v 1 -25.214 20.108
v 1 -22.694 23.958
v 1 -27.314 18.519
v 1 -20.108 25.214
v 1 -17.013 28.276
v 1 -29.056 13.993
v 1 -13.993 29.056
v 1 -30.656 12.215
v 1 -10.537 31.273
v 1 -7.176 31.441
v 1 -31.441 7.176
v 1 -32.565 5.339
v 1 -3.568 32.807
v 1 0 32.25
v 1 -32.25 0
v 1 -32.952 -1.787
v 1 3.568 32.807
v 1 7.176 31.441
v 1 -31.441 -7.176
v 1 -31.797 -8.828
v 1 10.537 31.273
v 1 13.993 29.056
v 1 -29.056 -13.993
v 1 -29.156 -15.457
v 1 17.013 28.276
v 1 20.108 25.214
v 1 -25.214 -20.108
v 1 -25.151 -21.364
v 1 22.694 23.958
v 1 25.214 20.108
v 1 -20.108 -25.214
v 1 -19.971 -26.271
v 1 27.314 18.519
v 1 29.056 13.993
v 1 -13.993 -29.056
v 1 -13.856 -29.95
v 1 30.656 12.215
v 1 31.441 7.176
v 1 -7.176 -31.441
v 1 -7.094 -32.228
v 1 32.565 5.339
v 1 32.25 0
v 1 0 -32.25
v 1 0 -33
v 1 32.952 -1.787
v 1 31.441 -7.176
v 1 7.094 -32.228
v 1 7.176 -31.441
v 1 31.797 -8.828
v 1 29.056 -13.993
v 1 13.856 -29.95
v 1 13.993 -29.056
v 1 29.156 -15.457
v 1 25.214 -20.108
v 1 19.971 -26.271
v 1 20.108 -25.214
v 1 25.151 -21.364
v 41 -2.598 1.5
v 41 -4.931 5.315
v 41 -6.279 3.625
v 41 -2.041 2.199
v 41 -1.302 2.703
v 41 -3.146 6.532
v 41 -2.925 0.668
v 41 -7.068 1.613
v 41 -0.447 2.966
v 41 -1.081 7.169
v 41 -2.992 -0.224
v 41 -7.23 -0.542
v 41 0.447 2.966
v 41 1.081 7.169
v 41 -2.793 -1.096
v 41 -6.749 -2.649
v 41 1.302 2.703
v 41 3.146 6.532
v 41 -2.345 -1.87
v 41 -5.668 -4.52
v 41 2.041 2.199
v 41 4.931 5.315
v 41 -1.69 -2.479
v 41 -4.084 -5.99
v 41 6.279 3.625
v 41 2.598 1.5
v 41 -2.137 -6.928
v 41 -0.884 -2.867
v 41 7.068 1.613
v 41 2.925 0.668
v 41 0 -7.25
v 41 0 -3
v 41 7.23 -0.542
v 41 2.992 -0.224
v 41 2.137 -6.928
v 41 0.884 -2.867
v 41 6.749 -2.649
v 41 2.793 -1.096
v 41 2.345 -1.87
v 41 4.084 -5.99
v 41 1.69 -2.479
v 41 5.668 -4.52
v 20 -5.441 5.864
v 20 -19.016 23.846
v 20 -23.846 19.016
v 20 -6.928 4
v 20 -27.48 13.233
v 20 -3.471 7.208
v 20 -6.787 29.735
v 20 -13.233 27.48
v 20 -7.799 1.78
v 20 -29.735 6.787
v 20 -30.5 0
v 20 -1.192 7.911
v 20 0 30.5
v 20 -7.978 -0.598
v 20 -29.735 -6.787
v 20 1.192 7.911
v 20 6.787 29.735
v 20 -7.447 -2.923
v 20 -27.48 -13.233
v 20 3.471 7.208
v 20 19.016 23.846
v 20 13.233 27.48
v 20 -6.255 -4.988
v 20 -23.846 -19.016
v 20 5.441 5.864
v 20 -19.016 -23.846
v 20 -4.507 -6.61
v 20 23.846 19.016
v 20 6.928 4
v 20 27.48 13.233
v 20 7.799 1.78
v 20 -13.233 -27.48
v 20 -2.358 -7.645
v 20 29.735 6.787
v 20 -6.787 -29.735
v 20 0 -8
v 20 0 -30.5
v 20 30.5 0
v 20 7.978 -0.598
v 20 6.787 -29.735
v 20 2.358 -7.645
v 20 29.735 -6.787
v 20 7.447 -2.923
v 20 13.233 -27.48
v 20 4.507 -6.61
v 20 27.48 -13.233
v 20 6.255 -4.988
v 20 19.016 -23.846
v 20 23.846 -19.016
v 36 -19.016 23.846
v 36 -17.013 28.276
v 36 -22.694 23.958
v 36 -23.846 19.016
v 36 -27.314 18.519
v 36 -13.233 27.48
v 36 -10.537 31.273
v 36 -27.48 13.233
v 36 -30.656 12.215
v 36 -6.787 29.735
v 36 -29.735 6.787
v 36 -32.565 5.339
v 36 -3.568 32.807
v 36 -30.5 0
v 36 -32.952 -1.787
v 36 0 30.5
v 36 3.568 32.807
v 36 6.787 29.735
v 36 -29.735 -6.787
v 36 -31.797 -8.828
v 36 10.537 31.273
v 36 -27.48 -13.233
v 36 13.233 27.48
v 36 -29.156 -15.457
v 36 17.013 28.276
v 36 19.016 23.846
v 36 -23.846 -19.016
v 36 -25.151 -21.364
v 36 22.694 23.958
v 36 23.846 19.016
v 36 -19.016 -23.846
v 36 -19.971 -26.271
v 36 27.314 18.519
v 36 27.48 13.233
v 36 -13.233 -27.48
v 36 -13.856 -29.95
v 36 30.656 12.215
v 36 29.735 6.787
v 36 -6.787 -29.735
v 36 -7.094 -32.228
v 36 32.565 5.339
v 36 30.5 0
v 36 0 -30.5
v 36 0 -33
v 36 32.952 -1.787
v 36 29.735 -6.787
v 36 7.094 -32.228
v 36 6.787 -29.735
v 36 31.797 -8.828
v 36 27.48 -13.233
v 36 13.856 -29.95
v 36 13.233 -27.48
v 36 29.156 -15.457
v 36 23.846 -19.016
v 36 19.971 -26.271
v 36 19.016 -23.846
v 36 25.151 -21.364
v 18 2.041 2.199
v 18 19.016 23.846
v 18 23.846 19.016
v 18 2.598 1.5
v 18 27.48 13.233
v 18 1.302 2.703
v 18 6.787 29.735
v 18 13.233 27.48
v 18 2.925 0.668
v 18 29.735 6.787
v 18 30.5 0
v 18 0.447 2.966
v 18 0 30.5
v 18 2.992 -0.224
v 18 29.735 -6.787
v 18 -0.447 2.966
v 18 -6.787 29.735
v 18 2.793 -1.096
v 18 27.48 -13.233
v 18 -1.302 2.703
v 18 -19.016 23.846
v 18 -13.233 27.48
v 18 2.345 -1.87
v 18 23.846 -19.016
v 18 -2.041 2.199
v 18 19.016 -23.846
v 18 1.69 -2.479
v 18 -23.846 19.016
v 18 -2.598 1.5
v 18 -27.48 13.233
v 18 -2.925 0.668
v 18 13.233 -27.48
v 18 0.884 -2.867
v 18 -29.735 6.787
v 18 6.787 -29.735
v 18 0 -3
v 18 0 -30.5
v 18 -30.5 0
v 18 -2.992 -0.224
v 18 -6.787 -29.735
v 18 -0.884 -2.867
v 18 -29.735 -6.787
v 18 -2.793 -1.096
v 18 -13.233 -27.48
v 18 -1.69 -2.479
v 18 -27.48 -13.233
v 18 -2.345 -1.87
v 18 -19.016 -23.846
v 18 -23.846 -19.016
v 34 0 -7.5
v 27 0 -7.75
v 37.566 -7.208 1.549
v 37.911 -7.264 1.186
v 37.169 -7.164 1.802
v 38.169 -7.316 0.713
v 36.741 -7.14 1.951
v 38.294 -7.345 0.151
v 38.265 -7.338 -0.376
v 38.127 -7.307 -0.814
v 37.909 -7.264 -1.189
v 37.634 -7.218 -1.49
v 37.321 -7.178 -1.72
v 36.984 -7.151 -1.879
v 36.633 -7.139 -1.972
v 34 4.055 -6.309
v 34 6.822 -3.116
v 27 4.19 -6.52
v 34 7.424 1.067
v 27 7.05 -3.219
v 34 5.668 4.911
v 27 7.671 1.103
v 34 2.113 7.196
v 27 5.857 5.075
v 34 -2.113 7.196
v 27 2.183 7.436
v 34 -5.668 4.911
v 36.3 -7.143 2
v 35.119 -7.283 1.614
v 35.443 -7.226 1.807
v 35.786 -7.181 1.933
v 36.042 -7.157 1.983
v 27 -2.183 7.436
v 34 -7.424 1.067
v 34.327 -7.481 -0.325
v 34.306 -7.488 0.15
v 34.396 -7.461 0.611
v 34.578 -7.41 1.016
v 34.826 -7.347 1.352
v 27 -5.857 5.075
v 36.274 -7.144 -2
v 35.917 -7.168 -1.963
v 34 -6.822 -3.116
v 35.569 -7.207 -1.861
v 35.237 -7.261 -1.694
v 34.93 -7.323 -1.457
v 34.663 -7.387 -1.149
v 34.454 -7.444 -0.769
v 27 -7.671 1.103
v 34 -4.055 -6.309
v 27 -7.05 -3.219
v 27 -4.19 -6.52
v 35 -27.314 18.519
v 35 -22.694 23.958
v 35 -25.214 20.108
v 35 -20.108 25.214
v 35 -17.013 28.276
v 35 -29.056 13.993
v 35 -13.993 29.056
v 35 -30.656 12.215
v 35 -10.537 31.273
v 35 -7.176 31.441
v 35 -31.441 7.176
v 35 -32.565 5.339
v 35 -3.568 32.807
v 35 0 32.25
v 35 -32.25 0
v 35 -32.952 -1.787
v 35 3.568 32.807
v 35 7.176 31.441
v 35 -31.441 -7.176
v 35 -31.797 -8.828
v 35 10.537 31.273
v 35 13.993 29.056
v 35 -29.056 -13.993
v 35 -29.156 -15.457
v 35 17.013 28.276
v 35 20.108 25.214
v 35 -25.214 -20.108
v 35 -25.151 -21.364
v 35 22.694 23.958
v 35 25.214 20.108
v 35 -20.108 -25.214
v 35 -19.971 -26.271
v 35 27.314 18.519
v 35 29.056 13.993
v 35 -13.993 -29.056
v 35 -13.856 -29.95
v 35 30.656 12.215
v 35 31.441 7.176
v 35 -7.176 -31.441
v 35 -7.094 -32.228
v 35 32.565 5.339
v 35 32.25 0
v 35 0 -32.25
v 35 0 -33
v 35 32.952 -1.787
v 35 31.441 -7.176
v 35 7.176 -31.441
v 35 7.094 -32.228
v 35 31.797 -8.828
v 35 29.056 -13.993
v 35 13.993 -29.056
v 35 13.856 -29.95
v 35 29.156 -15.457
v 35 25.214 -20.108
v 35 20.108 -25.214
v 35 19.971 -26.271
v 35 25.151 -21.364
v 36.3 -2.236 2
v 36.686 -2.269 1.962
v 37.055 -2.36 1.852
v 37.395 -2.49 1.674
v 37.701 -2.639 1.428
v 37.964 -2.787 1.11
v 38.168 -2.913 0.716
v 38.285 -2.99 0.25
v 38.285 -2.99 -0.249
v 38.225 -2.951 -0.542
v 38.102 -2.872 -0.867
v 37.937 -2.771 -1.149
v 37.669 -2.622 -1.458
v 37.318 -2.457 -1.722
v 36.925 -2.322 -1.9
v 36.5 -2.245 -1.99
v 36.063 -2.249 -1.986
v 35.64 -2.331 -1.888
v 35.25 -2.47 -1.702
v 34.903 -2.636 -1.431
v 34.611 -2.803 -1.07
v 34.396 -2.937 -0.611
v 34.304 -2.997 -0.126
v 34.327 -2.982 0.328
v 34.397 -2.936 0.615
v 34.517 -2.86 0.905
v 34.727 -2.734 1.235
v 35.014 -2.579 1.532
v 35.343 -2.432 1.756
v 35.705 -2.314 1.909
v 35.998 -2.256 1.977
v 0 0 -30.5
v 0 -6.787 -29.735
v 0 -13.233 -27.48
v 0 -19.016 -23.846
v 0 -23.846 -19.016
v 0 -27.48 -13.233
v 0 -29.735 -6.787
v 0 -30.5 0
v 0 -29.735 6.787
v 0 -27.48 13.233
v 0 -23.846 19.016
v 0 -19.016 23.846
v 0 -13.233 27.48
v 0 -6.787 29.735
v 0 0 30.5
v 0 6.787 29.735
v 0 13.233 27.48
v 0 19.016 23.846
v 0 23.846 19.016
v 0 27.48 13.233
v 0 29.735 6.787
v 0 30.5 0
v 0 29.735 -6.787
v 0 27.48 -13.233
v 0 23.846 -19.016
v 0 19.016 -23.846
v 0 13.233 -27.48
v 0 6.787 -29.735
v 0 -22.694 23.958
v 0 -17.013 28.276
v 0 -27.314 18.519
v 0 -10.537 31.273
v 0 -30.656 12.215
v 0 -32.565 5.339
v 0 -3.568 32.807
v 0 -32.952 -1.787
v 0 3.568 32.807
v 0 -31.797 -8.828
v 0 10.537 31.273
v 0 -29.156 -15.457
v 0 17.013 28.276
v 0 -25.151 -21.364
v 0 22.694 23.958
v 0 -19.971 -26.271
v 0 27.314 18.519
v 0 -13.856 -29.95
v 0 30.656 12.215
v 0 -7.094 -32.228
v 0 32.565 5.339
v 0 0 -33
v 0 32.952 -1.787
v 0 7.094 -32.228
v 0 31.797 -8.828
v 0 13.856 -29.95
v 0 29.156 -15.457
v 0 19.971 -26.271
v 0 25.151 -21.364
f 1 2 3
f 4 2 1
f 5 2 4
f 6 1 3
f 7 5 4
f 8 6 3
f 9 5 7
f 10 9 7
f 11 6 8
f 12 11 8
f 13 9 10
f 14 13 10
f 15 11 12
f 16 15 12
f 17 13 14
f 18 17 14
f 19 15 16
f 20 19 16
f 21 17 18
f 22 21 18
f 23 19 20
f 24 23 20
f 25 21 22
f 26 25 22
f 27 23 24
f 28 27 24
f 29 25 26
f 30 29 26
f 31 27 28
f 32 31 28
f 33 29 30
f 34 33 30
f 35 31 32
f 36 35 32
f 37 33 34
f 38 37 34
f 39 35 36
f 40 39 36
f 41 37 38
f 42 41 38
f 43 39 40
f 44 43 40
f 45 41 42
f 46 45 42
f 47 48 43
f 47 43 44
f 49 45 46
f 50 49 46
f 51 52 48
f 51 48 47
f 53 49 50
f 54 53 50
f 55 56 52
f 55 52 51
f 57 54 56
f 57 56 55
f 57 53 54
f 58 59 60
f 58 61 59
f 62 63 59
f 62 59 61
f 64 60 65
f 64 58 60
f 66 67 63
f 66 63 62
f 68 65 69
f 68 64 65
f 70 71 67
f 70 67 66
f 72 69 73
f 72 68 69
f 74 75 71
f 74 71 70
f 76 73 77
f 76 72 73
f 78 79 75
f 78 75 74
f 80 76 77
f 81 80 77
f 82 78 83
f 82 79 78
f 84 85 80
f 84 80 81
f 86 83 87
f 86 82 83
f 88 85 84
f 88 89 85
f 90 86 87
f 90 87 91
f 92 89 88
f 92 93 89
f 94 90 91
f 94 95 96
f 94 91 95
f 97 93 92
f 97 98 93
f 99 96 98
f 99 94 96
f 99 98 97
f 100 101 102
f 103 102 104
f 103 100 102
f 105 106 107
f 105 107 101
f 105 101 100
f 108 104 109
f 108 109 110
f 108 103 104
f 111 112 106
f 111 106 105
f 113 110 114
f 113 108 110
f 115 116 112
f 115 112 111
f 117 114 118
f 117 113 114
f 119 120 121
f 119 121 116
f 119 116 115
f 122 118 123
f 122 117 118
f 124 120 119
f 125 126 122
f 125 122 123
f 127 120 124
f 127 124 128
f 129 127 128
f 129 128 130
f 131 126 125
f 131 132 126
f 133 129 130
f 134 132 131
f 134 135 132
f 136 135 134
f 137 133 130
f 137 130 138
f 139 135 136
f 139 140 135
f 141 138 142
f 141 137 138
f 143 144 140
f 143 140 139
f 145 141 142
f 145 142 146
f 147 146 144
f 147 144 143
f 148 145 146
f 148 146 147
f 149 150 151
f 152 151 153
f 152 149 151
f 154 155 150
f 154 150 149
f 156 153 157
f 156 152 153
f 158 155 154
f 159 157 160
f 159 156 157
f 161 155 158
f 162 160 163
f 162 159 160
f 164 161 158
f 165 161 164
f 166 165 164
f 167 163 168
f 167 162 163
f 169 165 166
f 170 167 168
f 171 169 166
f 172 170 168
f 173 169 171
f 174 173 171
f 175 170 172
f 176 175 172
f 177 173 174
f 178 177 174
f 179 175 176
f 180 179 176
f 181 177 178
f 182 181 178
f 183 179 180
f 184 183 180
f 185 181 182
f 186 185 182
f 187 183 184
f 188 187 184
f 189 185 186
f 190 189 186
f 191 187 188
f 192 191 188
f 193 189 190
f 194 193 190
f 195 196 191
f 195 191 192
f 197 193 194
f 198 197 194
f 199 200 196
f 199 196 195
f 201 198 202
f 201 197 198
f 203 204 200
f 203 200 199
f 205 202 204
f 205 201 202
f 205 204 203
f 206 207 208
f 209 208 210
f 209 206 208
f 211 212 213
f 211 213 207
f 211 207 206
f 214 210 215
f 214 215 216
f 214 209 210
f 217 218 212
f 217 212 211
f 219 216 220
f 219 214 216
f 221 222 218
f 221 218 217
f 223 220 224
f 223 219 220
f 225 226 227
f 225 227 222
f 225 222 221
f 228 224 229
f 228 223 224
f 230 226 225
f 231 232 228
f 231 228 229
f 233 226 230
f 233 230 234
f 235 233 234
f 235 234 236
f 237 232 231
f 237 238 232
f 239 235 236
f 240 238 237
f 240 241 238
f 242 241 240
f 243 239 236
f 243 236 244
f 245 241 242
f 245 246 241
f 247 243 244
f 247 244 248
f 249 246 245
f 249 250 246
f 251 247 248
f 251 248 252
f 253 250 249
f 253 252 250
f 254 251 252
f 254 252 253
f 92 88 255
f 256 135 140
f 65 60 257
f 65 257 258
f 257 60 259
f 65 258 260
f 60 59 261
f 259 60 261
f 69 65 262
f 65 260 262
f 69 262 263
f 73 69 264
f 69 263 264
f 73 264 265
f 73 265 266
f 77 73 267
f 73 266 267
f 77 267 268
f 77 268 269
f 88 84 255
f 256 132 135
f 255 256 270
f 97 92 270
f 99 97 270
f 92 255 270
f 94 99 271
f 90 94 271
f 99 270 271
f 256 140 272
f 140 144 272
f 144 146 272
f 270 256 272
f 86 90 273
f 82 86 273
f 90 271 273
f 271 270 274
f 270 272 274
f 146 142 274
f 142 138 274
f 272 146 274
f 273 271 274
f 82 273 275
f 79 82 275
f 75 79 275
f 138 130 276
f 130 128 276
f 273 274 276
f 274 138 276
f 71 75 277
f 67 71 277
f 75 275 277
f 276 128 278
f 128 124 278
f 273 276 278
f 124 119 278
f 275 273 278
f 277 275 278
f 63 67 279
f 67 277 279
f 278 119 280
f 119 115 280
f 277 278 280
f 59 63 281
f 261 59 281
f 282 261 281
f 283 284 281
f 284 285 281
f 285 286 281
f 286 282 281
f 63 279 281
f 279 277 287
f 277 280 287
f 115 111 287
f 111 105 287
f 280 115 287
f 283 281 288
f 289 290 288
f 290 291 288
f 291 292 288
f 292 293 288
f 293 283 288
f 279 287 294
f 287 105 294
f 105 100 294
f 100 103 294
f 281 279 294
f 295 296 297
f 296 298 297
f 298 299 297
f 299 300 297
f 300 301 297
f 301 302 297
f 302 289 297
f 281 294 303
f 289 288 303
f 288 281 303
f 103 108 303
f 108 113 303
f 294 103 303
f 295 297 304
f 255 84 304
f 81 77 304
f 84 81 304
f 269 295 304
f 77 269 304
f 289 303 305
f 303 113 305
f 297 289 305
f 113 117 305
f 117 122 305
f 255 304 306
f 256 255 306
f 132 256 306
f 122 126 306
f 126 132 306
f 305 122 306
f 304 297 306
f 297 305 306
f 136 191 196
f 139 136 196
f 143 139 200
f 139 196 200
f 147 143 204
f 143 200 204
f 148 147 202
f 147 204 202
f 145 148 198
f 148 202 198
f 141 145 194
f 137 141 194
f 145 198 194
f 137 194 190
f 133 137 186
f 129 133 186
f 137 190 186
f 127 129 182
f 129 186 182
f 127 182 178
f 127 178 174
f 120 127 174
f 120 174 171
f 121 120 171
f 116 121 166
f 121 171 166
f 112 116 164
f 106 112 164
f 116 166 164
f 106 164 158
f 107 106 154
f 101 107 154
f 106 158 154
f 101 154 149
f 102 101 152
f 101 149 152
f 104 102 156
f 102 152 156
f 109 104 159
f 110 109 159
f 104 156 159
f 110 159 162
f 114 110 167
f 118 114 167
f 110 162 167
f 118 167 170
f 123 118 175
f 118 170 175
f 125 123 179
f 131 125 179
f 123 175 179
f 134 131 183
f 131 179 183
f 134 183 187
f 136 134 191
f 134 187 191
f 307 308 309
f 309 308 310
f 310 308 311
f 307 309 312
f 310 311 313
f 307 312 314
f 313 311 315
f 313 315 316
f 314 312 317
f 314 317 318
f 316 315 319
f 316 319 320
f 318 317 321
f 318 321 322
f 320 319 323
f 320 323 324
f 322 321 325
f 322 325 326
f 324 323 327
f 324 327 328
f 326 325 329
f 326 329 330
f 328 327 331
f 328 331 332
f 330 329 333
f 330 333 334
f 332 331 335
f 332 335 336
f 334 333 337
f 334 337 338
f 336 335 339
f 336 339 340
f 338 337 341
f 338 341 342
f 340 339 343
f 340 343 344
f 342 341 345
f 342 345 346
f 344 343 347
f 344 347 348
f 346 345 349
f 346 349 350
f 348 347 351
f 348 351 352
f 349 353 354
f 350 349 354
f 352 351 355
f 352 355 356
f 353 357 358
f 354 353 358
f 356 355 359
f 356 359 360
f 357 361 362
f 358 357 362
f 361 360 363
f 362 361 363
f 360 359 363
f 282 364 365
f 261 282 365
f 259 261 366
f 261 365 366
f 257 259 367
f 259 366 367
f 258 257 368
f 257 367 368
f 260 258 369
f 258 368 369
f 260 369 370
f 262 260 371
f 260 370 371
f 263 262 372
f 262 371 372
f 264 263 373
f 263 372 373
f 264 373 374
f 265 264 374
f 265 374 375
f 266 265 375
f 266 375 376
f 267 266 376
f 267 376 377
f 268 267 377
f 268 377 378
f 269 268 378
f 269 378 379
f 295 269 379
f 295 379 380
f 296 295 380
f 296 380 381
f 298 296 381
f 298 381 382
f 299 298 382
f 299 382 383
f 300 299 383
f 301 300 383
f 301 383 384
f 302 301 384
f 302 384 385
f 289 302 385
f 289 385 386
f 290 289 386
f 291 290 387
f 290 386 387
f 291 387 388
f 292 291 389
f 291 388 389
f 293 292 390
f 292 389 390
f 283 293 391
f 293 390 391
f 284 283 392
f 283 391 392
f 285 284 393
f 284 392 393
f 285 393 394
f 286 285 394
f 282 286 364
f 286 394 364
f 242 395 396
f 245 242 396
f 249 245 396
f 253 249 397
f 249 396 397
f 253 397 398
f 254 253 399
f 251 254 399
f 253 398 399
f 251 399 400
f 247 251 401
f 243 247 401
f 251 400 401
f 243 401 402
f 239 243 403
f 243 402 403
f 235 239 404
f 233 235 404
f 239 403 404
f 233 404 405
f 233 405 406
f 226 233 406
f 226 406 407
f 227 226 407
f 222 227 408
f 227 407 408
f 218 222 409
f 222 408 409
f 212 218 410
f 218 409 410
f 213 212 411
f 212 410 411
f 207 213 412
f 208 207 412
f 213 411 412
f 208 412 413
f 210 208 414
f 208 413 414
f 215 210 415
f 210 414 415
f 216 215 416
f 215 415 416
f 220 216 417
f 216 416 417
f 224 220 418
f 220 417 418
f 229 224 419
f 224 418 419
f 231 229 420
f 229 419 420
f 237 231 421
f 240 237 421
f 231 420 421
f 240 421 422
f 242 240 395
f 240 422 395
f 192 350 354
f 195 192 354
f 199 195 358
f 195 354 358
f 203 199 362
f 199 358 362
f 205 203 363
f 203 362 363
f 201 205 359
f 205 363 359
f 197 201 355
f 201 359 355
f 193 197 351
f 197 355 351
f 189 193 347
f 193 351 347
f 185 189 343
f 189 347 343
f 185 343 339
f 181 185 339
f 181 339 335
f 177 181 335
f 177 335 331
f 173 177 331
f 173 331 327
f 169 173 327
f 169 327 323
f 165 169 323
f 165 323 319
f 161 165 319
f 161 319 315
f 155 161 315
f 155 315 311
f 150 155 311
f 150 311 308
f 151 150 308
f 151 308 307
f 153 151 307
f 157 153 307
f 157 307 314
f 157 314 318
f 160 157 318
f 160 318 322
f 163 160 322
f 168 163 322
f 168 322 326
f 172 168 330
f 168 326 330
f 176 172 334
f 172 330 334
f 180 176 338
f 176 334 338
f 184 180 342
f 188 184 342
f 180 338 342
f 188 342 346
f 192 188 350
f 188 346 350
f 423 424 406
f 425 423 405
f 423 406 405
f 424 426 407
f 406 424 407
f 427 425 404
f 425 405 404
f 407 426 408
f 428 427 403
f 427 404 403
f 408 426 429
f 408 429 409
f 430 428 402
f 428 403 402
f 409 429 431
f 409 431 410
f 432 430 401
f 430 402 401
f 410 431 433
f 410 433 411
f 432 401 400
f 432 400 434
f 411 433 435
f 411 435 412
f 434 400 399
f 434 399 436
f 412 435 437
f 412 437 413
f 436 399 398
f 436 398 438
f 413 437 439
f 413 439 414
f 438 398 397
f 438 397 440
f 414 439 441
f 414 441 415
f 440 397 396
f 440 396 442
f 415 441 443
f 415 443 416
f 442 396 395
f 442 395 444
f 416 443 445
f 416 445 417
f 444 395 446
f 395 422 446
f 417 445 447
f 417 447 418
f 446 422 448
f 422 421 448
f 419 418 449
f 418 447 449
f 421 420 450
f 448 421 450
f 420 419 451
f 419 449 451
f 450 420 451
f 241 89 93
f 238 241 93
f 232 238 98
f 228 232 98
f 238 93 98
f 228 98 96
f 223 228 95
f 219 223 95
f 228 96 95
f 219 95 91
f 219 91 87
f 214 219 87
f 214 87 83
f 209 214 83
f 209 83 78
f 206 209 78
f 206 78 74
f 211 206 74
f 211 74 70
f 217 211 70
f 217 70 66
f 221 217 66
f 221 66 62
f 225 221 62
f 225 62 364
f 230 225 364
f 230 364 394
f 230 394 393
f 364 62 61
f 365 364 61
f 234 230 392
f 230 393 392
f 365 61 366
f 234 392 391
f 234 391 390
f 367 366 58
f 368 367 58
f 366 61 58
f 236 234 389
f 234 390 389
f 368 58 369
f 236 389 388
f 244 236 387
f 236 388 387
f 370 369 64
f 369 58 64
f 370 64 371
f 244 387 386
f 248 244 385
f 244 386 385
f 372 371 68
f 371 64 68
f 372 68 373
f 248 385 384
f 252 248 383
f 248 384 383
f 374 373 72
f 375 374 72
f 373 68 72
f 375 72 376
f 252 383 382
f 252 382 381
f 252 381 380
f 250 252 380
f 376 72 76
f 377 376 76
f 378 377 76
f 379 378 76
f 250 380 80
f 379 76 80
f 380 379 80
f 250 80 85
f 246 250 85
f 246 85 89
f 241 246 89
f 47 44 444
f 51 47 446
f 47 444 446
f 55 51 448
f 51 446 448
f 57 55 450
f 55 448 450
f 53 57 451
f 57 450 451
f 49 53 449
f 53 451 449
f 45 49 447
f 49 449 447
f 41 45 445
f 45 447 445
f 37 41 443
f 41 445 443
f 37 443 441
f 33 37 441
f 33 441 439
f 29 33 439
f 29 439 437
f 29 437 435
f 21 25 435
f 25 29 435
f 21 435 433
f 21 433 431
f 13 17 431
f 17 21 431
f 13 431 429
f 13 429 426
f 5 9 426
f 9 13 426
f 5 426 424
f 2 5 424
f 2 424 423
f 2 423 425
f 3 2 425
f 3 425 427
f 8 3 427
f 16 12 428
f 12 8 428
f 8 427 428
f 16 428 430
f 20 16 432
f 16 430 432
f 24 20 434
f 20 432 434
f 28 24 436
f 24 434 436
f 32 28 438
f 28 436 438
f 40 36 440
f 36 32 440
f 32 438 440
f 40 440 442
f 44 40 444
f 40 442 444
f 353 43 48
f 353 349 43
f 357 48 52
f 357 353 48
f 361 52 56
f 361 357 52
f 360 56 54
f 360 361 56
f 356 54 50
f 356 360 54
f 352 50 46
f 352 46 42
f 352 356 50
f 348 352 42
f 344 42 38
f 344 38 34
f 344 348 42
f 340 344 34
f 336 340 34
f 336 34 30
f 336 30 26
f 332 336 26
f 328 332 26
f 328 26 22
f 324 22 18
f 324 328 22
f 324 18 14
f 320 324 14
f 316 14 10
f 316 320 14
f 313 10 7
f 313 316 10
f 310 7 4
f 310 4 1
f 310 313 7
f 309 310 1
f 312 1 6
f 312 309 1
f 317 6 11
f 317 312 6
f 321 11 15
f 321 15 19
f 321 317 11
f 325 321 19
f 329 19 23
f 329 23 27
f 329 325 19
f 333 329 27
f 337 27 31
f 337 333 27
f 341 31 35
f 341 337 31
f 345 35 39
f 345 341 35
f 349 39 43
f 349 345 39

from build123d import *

# Parameters (mm, degrees)
SKETCH1_R               = 33
BOSS_EXTRUDE1_DEPTH     = 36
SKETCH2_R               = 30.5
SKETCH2_R_2             = 8
SKETCH2_R_3             = 3
CUT_EXTRUDE2_DEPTH      = 16
SKETCH6_R               = 7.25
SKETCH5_R               = 8
SKETCH7_R               = 30.5
CUT_EXTRUDE3_DEPTH      = 18
SKETCH8_R               = 3
CUT_EXTRUDE4_DEPTH      = 77
SKETCH9_R               = 42.905856896
SKETCH9_R_2             = 32.25
CUT_EXTRUDE5_DEPTH      = 17
CUT_EXTRUDE5_DEPTH_BACK = 17
SKETCH10_R              = 2
CUT_EXTRUDE6_DEPTH      = 17


with BuildPart() as part:
    # Sketch1 → Boss-Extrude1 (new body)
    with BuildSketch(Plane(origin=(0, 0, 0), x_dir=(0, 0, -1), z_dir=(1, 0, 0))):
        Circle(SKETCH1_R)
    extrude(amount=BOSS_EXTRUDE1_DEPTH)

    # Sketch2 → Cut-Extrude2 (cut)
    with BuildSketch(Plane(origin=(36, 0, 0), x_dir=(0, 0, -1), z_dir=(1, 0, 0))):
        Circle(SKETCH2_R)
        Circle(SKETCH2_R_2, mode=Mode.SUBTRACT)
        Circle(SKETCH2_R_2)
        Circle(SKETCH2_R_3, mode=Mode.SUBTRACT)
        Circle(SKETCH2_R_3)
    extrude(amount=-CUT_EXTRUDE2_DEPTH, mode=Mode.SUBTRACT)

    # Sketch6 → Loft2 section 0
    with BuildSketch(Plane(origin=(41, 0, 0), x_dir=(0, 0, -1), z_dir=(1, 0, 0))):
        Circle(SKETCH6_R)
    # Sketch5 → Loft2 section 1
    with BuildSketch(Plane(origin=(20, 0, 0), x_dir=(0, 0, -1), z_dir=(1, 0, 0))):
        Circle(SKETCH5_R)
    loft()

    # Sketch7 → Cut-Extrude3 (cut)
    with BuildSketch(Plane.ZY):
        with Locations(Location((0, 0, 0), (0, 0, 180))):
            Circle(SKETCH7_R)
    extrude(amount=-CUT_EXTRUDE3_DEPTH, mode=Mode.SUBTRACT)

    # Sketch8 → Cut-Extrude4 (cut)
    with BuildSketch(Plane(origin=(41, 0, 0), x_dir=(0, 0, -1), z_dir=(1, 0, 0))):
        Circle(SKETCH8_R)
    extrude(amount=-CUT_EXTRUDE4_DEPTH, mode=Mode.SUBTRACT)

    # Sketch9 → Cut-Extrude5 (cut, two sides)
    with BuildSketch(Plane(origin=(18, 0, 0), x_dir=(0, 0, -1), z_dir=(1, 0, 0))) as cut_extrude5_sk:
        Circle(SKETCH9_R)
        Circle(SKETCH9_R_2, mode=Mode.SUBTRACT)
    extrude(amount=CUT_EXTRUDE5_DEPTH, mode=Mode.SUBTRACT)
    extrude(cut_extrude5_sk.sketch, amount=-CUT_EXTRUDE5_DEPTH_BACK, mode=Mode.SUBTRACT)

    # Sketch10 → Cut-Extrude6 (cut)
    with BuildSketch(Plane(origin=(0, 0, 0), x_dir=(1, 0, 0), z_dir=(0, 1, 0))):
        with Locations(Location((36.300187477, 0, 0), (0, 0, 270))):
            Circle(SKETCH10_R)
    extrude(amount=-CUT_EXTRUDE6_DEPTH, mode=Mode.SUBTRACT)


solid = part.part
